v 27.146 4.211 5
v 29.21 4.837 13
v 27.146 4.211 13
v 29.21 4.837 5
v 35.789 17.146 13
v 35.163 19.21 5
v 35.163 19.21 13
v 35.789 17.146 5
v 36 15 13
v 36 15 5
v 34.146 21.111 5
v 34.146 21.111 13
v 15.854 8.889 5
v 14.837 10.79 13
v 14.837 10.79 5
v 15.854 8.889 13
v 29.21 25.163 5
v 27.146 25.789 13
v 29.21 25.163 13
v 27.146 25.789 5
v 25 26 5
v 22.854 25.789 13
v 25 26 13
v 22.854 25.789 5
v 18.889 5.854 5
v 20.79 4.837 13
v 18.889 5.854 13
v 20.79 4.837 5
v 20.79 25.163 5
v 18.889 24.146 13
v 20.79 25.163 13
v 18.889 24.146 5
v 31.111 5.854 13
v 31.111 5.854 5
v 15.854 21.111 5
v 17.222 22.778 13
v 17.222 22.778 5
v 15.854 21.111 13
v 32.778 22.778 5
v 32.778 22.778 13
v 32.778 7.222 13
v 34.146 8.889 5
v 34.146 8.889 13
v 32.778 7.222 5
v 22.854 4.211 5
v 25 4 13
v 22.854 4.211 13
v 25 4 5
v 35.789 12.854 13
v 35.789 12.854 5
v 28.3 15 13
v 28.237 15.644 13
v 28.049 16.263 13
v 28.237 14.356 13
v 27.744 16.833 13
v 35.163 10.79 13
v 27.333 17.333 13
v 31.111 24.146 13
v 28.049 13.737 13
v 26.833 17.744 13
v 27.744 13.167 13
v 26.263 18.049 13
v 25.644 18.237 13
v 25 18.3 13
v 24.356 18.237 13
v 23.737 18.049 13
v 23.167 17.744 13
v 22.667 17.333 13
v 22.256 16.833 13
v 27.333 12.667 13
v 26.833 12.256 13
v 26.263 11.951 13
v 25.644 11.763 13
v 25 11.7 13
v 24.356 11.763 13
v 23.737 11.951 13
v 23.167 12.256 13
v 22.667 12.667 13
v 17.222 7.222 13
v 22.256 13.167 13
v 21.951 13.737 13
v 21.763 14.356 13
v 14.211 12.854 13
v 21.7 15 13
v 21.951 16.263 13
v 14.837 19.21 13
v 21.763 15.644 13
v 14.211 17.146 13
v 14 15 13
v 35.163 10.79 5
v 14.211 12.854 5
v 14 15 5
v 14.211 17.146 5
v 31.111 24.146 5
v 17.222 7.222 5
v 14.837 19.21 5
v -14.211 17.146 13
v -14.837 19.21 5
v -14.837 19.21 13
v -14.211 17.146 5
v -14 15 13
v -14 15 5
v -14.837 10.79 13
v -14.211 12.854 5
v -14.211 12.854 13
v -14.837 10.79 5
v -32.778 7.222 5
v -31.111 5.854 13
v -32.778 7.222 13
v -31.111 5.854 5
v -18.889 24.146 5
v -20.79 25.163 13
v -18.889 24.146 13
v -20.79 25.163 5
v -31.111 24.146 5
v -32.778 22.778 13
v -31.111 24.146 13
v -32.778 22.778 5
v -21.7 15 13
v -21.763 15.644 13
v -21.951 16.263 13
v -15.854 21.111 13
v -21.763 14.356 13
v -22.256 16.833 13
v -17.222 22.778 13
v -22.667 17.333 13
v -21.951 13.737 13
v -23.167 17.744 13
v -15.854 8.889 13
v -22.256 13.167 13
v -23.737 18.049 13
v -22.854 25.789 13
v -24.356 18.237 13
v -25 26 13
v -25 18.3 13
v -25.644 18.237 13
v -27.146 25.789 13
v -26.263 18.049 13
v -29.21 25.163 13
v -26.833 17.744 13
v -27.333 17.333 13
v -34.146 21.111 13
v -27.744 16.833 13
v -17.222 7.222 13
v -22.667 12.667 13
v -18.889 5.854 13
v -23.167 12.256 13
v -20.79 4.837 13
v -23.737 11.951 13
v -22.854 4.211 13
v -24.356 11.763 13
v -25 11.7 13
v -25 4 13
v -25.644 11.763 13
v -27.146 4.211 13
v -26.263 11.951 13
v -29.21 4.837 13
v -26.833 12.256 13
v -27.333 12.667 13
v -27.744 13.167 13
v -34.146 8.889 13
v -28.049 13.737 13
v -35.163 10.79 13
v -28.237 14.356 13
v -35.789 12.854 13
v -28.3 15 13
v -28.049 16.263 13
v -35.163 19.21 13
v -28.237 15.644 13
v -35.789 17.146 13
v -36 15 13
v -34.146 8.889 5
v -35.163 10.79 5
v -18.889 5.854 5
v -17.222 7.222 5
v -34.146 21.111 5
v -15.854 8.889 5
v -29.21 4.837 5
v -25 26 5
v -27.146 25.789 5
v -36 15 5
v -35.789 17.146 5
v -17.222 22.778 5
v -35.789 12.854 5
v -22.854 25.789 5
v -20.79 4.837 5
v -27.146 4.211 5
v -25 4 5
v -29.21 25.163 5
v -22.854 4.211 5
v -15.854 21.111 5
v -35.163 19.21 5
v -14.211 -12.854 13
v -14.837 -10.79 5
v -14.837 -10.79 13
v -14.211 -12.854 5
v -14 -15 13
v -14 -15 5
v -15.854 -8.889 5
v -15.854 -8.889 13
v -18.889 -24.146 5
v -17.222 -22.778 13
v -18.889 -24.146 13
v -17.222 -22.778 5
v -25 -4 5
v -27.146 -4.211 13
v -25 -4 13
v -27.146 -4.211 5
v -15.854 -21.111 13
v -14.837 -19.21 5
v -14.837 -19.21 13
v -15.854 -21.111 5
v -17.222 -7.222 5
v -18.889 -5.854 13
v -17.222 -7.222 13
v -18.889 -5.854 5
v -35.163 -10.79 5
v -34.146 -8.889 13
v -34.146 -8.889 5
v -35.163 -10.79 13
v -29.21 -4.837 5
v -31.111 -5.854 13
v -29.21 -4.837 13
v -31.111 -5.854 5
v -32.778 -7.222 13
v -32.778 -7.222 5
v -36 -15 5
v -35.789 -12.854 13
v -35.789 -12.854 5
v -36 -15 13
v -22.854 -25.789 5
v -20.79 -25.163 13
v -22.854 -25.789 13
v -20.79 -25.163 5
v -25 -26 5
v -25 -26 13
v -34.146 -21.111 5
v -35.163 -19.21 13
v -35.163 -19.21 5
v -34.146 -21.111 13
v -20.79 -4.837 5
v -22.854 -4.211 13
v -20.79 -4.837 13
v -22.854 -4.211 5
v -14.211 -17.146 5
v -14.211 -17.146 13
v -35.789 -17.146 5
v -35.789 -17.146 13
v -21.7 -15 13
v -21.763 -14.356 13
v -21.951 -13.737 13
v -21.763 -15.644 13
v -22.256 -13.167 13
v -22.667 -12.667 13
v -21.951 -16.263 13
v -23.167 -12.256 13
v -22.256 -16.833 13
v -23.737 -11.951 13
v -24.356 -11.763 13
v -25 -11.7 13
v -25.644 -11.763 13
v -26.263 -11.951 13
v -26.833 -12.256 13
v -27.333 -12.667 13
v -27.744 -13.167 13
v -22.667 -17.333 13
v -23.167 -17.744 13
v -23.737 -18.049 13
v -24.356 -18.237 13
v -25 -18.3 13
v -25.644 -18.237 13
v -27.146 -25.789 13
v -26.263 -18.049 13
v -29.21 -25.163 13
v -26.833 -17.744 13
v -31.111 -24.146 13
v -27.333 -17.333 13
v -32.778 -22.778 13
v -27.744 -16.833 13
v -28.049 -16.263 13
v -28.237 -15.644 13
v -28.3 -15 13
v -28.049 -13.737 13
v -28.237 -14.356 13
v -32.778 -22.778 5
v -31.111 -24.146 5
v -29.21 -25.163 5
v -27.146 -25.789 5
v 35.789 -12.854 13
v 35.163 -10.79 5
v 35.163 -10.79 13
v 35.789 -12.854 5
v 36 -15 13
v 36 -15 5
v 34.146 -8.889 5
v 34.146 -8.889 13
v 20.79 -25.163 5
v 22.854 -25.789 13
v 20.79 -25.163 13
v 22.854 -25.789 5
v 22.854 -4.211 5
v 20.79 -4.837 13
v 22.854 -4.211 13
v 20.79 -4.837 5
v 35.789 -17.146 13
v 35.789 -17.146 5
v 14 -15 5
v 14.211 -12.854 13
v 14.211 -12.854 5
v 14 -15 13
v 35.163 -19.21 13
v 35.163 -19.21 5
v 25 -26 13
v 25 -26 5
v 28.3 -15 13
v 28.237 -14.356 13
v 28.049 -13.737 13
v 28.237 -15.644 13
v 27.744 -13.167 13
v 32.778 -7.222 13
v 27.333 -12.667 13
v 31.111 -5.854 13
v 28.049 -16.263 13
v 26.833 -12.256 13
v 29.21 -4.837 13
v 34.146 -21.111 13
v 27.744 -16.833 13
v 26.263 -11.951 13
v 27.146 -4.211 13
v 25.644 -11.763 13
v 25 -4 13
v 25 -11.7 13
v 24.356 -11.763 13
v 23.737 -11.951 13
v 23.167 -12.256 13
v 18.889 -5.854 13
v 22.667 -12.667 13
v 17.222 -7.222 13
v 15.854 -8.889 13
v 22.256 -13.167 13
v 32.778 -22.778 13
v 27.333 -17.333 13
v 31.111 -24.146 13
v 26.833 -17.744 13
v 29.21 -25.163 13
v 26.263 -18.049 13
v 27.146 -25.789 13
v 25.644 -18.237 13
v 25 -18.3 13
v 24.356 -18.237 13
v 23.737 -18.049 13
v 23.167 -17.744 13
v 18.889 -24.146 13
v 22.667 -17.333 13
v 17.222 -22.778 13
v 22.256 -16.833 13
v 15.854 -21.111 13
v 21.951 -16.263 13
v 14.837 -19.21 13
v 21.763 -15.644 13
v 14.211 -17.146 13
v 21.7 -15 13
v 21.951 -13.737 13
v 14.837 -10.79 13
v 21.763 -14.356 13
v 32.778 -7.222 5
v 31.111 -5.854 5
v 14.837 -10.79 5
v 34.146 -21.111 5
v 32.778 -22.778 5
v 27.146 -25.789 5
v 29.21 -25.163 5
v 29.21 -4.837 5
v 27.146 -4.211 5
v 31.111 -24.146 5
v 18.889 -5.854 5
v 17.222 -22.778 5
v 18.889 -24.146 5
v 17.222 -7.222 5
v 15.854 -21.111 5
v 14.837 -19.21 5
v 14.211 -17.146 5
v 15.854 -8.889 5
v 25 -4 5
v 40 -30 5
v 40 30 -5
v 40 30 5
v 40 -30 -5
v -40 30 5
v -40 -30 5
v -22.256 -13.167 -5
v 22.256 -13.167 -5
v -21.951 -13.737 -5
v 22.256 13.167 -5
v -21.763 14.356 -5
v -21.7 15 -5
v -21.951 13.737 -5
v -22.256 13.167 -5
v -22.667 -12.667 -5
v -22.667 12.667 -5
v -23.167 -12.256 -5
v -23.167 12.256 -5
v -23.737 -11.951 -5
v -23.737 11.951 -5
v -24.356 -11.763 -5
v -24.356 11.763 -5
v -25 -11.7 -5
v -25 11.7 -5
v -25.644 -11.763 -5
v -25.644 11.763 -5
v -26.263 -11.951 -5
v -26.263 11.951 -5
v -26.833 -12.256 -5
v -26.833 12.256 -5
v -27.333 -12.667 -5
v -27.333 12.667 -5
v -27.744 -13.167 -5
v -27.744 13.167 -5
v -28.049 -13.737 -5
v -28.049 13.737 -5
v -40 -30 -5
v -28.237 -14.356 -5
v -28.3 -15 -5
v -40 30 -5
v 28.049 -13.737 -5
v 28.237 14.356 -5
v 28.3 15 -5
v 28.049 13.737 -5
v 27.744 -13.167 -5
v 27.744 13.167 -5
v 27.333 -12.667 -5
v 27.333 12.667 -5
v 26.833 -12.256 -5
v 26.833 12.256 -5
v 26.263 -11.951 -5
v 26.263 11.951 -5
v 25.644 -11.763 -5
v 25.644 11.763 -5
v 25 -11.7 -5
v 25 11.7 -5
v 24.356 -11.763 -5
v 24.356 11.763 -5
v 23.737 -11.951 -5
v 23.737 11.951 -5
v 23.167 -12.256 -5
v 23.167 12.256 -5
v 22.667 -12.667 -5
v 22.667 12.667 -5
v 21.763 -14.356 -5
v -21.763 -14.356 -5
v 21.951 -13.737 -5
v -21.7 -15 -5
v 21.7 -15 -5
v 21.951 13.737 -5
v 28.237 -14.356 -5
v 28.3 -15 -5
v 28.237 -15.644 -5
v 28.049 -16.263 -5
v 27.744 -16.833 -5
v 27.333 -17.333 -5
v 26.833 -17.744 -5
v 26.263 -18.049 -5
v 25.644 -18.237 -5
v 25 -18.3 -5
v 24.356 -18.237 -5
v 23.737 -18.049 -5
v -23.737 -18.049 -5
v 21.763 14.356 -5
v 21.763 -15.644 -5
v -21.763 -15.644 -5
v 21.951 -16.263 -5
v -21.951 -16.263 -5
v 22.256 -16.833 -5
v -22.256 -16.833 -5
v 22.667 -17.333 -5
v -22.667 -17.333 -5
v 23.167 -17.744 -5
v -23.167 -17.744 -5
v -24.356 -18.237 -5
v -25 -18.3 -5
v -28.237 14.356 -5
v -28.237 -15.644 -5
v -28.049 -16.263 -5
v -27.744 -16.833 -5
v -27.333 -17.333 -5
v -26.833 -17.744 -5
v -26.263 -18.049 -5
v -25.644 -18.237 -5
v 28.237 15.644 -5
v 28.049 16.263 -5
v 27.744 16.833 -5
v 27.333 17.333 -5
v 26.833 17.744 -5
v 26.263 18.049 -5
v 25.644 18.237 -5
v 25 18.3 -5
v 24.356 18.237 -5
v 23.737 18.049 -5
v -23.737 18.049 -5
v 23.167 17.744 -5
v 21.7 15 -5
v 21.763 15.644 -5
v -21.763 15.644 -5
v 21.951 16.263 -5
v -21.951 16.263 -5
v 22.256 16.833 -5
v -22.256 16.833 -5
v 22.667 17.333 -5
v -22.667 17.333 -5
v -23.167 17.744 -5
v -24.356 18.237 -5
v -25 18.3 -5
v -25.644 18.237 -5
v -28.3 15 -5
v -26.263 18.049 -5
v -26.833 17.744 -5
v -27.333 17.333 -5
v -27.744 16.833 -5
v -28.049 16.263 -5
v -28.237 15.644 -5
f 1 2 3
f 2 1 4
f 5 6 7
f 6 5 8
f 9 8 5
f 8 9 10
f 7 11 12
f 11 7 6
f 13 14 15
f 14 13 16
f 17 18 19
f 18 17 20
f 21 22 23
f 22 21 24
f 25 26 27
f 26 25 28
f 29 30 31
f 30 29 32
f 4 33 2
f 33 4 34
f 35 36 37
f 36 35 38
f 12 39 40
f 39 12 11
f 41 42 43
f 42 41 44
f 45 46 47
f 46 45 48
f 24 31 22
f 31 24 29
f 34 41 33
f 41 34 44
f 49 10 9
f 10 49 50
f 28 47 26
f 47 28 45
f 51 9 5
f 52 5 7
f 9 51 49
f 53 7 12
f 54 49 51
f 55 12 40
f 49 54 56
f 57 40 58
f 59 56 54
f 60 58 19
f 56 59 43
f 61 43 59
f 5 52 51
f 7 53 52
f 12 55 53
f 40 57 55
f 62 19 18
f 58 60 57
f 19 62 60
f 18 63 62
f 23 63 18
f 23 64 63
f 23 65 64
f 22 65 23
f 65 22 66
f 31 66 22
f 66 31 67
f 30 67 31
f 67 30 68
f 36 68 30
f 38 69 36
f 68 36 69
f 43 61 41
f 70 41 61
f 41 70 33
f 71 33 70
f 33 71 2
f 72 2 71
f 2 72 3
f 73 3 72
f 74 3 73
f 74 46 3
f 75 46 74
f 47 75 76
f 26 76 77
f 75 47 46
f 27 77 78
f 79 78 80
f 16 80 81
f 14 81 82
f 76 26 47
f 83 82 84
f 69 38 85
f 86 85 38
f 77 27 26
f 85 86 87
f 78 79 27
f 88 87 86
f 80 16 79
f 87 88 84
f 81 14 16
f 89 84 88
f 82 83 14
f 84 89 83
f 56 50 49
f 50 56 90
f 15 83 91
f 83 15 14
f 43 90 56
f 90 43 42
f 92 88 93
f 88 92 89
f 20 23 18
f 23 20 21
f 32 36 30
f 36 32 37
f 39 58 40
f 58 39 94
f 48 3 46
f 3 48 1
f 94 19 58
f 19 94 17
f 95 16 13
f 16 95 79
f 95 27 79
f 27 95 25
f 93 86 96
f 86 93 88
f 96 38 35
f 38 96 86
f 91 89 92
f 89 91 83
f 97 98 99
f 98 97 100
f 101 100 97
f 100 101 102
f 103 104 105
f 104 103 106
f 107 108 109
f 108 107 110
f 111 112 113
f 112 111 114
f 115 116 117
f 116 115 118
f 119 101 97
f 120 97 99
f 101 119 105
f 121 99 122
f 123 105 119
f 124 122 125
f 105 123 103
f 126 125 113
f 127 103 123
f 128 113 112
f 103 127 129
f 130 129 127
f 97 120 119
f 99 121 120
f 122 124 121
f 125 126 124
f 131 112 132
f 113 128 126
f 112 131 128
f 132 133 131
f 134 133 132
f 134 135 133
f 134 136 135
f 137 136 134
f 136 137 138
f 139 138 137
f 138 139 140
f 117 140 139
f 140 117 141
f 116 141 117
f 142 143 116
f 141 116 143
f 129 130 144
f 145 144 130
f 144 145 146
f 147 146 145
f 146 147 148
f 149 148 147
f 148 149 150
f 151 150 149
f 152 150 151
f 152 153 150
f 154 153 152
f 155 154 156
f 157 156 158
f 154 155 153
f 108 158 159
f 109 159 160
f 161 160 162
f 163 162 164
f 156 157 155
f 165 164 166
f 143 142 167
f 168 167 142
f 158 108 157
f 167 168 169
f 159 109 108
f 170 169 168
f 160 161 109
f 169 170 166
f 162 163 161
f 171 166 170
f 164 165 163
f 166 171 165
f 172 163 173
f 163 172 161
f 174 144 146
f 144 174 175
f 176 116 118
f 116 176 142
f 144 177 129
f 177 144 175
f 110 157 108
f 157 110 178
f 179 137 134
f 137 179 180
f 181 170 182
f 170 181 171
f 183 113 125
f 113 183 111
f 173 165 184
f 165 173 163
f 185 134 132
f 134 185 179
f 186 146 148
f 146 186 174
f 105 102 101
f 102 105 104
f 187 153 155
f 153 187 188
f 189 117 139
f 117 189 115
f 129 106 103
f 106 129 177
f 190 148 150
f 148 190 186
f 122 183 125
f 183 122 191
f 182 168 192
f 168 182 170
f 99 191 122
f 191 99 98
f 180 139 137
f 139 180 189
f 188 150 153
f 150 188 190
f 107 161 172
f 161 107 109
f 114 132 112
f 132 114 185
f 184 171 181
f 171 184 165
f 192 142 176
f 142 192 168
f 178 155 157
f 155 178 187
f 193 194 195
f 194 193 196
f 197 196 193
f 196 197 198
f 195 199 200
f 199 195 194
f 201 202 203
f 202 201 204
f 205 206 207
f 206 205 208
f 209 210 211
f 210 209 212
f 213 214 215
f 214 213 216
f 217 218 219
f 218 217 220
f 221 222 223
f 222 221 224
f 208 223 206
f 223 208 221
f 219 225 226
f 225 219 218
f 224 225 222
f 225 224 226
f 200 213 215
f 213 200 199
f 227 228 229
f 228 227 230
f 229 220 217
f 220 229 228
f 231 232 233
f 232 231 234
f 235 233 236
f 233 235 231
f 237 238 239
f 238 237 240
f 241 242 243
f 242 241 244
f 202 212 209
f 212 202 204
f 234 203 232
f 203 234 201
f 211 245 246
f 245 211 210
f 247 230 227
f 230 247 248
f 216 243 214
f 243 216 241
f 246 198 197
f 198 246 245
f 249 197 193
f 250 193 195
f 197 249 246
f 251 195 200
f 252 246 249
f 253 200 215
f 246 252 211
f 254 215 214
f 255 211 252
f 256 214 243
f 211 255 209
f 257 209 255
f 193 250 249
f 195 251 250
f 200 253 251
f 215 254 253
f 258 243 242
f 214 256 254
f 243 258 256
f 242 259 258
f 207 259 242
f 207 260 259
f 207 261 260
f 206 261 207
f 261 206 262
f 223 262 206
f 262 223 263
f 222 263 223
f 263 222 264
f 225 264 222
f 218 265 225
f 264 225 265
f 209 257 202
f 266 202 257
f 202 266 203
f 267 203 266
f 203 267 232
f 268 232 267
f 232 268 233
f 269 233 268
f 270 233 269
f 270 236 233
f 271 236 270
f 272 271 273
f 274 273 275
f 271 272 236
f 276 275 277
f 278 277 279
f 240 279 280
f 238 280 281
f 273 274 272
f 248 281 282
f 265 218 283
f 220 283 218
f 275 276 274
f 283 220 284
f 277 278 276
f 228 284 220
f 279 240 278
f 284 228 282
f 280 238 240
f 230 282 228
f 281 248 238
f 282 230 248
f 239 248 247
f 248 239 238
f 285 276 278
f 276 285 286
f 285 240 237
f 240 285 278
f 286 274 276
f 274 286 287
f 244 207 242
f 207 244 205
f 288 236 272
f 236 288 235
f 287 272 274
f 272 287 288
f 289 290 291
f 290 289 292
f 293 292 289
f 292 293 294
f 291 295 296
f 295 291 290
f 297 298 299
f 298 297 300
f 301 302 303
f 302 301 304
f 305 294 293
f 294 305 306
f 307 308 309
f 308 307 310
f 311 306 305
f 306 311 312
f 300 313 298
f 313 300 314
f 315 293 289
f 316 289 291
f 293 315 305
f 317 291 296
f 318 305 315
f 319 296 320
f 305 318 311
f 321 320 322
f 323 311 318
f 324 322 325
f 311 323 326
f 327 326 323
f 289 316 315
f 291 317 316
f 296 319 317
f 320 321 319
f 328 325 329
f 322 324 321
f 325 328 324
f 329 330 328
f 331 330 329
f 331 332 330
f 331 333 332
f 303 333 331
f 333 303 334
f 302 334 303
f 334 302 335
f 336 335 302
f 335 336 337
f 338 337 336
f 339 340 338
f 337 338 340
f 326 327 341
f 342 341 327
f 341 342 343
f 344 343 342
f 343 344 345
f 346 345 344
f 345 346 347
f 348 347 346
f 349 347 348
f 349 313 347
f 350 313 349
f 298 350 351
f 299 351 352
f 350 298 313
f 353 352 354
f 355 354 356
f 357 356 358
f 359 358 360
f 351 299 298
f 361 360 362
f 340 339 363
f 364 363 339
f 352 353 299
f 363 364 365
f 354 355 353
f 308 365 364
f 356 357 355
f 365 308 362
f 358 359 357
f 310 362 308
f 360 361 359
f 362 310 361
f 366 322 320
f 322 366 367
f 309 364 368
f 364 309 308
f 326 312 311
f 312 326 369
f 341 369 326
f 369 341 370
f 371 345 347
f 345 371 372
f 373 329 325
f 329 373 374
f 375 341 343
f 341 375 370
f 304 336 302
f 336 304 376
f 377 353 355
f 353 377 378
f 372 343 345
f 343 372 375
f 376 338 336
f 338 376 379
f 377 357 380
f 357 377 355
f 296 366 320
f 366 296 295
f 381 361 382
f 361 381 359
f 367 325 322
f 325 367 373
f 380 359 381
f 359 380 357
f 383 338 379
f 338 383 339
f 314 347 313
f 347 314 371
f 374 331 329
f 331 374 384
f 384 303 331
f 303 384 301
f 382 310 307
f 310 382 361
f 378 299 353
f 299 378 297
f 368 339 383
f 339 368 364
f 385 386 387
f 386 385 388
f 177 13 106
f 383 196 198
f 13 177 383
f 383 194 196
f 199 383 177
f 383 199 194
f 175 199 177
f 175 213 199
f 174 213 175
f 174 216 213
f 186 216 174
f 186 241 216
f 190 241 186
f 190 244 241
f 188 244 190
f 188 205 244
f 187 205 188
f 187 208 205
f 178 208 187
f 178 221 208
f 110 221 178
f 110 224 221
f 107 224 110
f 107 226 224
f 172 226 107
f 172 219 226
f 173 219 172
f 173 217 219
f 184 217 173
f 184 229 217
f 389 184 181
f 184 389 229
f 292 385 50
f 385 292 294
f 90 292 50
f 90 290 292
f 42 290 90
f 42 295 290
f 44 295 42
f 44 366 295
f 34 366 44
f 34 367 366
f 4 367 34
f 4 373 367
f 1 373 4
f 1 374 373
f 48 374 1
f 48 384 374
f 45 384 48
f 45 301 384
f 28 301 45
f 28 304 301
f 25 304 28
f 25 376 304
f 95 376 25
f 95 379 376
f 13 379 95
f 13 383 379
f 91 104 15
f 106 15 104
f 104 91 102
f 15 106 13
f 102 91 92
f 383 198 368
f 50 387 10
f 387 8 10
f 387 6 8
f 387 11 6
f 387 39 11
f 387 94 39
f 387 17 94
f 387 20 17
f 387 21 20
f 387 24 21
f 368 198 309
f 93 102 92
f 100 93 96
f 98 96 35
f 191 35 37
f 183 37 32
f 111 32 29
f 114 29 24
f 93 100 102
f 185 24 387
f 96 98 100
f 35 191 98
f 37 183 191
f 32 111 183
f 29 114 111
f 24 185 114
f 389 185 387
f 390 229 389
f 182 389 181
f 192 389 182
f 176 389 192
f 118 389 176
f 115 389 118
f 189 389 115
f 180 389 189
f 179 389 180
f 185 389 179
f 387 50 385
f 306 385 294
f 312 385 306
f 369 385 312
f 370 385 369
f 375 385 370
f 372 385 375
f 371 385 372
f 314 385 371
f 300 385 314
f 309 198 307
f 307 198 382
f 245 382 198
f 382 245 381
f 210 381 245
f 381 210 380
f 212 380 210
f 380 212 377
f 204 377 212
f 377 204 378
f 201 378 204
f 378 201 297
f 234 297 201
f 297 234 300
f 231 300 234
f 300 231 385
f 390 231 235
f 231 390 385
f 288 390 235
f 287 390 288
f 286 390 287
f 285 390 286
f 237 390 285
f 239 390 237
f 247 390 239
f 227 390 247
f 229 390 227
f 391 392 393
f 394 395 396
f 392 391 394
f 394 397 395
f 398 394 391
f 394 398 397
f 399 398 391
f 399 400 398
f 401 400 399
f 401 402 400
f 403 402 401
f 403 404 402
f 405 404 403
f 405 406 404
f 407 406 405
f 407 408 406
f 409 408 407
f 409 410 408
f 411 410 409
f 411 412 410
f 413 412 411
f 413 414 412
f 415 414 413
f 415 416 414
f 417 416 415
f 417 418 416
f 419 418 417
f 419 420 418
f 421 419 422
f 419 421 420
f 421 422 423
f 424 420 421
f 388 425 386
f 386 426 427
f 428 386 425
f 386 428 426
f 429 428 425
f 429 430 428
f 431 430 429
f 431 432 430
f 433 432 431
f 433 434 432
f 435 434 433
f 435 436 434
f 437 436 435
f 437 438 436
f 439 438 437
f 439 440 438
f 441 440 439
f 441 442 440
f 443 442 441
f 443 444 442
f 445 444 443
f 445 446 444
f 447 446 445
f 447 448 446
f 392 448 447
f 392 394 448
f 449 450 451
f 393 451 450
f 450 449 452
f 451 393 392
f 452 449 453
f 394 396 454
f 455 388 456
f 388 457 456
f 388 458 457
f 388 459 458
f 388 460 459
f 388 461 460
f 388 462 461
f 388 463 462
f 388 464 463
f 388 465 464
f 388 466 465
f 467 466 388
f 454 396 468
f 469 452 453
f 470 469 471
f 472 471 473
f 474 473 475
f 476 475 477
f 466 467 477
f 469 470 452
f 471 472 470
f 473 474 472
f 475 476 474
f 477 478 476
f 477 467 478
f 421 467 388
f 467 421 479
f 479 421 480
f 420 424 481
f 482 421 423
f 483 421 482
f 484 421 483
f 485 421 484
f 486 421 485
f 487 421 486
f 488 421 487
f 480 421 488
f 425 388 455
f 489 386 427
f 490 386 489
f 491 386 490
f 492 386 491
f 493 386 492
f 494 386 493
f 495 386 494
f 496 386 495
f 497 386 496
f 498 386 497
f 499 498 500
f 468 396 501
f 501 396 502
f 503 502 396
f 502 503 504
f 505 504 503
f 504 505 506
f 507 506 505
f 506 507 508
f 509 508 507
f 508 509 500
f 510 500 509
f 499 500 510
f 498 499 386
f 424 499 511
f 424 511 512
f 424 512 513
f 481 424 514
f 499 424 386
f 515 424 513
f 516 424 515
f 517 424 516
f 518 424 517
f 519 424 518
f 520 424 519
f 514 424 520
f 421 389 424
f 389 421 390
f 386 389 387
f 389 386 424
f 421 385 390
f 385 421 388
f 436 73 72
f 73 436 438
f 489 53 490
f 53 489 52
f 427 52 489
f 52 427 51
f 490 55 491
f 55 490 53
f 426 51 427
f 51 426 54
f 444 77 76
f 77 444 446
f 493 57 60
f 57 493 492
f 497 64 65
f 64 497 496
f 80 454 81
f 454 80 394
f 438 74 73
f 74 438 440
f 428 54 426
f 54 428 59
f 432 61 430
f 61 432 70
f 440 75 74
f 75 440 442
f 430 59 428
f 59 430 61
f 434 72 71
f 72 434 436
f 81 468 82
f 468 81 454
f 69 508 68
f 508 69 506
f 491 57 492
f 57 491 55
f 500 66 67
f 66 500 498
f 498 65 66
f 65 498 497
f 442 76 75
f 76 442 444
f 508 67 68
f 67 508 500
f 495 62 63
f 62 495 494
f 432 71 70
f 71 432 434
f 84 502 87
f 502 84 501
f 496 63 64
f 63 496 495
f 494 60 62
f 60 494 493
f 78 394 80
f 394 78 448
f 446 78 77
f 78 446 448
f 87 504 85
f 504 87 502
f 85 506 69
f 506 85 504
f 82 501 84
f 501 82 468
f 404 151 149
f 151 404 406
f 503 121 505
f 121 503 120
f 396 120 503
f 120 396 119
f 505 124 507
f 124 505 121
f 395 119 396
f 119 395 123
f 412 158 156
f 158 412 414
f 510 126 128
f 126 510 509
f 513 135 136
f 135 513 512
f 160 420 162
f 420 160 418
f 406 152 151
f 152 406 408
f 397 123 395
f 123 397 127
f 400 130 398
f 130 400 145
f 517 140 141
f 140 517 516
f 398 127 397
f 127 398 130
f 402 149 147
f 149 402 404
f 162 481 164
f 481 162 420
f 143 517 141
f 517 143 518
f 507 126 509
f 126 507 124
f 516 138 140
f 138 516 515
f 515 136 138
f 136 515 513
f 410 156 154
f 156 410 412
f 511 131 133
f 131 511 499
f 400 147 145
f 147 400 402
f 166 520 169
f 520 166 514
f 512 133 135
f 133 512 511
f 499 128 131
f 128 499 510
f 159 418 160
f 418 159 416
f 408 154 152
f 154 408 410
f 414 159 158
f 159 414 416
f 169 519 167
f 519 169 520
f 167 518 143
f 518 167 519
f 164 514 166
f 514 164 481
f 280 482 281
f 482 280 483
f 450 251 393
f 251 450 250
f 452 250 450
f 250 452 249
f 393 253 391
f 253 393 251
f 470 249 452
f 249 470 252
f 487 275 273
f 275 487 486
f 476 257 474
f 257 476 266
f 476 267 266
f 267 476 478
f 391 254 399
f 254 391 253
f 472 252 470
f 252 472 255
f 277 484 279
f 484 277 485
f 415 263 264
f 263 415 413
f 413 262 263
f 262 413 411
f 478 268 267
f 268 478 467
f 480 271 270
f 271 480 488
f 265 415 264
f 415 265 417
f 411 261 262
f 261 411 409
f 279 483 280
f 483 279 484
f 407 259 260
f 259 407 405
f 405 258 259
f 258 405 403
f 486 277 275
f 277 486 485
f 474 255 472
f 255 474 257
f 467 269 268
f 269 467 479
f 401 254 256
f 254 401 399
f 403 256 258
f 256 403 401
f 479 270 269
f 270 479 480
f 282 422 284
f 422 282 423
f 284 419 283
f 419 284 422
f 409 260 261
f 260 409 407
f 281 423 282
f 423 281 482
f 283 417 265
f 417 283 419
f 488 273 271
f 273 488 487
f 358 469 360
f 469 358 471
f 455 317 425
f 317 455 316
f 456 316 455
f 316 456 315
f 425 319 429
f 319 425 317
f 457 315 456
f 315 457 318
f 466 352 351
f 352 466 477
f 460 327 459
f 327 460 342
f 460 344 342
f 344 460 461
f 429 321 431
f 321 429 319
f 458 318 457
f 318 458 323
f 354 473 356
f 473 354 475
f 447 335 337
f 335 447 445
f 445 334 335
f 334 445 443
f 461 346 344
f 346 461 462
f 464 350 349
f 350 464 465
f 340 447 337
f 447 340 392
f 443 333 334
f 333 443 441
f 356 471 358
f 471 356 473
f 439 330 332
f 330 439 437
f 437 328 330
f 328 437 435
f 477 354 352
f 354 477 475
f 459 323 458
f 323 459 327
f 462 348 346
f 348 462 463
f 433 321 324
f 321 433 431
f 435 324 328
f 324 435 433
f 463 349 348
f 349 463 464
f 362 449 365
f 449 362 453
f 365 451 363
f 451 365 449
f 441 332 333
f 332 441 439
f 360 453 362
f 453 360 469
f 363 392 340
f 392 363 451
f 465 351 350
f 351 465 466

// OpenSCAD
$fn = 32;

// ----------------------------------------------------------------------
// Anchor pads 80 x 60 x 18
// four corner bosses with anchor holes
// ----------------------------------------------------------------------

// --- parameters (mm) ---
plate = [80, 60, 10];  // base plate size (x, y, z)
pads = 4;              // boss count, one per corner
edge = 15;             // boss centre offset from the plate edge
boss_d = 22;           // boss diameter
boss_h = 8;            // boss height above the base plate
hole_d = 6.6;          // hole diameter

// --- derived feature positions (mm) ---
height = plate[2] + boss_h;      // = 18   overall height of the part
corner_x = plate[0] / 2 - edge;  // = 25   boss centre X
corner_y = plate[1] / 2 - edge;  // = 15   boss centre Y
feature_centers = [
  [corner_x, corner_y],
  [-corner_x, corner_y],
  [-corner_x, -corner_y],
  [corner_x, -corner_y]
];   // boss centres, anchor holes are drilled there

// base plate, four bosses standing on it, anchor holes all the way through
difference() {
  union() {
    cube(plate, center = true);
    for (centre = feature_centers)
      translate([centre[0], centre[1], plate[2] / 2 - 1])
        cylinder(d = boss_d, h = boss_h + 1);
  }
  for (centre = feature_centers)
    translate([centre[0], centre[1], -height])
      cylinder(d = hole_d, h = 2 * height + 2);  // through boss and plate
}
